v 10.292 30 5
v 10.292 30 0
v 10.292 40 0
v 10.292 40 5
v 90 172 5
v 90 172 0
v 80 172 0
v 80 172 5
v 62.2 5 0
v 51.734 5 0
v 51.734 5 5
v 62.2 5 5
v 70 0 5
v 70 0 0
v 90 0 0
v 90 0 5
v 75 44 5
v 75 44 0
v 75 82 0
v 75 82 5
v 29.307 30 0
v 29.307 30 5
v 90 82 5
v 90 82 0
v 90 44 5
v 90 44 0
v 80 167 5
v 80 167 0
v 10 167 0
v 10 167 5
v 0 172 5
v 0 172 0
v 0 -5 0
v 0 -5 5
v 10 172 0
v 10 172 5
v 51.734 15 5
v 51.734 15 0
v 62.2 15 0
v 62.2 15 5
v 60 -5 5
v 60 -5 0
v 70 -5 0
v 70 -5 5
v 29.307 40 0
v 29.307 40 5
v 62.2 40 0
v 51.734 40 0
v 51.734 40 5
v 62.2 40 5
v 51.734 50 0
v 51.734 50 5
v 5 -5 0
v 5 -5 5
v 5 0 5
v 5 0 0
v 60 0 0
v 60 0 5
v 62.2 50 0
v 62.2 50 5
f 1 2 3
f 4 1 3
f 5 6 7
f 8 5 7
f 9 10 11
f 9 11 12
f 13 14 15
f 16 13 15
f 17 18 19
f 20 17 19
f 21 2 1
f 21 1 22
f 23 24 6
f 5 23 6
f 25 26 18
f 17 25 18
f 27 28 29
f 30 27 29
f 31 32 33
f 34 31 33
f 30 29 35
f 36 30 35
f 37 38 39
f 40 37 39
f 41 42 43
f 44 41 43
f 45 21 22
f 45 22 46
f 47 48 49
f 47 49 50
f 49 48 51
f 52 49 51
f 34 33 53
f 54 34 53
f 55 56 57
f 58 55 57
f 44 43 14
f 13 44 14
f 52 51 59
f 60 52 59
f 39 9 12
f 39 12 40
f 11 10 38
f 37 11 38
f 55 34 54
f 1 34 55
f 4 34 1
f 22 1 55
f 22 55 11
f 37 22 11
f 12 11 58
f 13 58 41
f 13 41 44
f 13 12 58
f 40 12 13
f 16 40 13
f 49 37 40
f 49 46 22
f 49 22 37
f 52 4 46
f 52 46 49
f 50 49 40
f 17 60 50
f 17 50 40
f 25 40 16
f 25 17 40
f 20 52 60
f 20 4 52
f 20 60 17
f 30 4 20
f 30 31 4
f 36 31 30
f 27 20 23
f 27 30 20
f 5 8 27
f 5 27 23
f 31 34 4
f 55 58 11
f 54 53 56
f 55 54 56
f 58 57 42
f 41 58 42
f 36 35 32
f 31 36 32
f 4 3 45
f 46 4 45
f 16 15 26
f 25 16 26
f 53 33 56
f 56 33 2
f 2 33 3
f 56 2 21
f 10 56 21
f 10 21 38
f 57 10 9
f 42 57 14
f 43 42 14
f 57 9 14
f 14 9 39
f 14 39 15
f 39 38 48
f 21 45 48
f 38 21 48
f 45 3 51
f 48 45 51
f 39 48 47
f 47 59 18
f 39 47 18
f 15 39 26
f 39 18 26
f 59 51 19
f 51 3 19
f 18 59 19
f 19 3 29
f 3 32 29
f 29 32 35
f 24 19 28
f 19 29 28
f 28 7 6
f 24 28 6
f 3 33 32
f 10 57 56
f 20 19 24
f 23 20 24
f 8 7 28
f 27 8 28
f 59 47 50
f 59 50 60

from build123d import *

# Parameters (mm, degrees)
ESQUISSE1_W        = 10.465871206
ESQUISSE1_H        = 10
ESQUISSE1_W_2      = 19.015615649
BOSS_EXTRU_1_DEPTH = 5


with BuildPart() as part:
    # Esquisse1 → Boss.-Extru.1 (new body)
    with BuildSketch(Plane.XY):
        Polygon((90, 82), (90, 167), (90, 172), (80, 172), (80, 167), (10, 167), (10, 172), (0, 172), (0, 167), (0, 0), (0, -5), (5, -5), (5, 0), (60, 0), (60, -5), (70, -5), (70, 0), (90, 0), (90, 44), (75, 44), (75, 82), align=None)
        with Locations((56.967345119, 45)):
            Rectangle(ESQUISSE1_W, ESQUISSE1_H, mode=Mode.SUBTRACT)
        with Locations((56.967345119, 10)):
            Rectangle(ESQUISSE1_W, ESQUISSE1_H, mode=Mode.SUBTRACT)
        with Locations((19.799482129, 35)):
            Rectangle(ESQUISSE1_W_2, ESQUISSE1_H, mode=Mode.SUBTRACT)
    extrude(amount=BOSS_EXTRU_1_DEPTH)


solid = part.part
